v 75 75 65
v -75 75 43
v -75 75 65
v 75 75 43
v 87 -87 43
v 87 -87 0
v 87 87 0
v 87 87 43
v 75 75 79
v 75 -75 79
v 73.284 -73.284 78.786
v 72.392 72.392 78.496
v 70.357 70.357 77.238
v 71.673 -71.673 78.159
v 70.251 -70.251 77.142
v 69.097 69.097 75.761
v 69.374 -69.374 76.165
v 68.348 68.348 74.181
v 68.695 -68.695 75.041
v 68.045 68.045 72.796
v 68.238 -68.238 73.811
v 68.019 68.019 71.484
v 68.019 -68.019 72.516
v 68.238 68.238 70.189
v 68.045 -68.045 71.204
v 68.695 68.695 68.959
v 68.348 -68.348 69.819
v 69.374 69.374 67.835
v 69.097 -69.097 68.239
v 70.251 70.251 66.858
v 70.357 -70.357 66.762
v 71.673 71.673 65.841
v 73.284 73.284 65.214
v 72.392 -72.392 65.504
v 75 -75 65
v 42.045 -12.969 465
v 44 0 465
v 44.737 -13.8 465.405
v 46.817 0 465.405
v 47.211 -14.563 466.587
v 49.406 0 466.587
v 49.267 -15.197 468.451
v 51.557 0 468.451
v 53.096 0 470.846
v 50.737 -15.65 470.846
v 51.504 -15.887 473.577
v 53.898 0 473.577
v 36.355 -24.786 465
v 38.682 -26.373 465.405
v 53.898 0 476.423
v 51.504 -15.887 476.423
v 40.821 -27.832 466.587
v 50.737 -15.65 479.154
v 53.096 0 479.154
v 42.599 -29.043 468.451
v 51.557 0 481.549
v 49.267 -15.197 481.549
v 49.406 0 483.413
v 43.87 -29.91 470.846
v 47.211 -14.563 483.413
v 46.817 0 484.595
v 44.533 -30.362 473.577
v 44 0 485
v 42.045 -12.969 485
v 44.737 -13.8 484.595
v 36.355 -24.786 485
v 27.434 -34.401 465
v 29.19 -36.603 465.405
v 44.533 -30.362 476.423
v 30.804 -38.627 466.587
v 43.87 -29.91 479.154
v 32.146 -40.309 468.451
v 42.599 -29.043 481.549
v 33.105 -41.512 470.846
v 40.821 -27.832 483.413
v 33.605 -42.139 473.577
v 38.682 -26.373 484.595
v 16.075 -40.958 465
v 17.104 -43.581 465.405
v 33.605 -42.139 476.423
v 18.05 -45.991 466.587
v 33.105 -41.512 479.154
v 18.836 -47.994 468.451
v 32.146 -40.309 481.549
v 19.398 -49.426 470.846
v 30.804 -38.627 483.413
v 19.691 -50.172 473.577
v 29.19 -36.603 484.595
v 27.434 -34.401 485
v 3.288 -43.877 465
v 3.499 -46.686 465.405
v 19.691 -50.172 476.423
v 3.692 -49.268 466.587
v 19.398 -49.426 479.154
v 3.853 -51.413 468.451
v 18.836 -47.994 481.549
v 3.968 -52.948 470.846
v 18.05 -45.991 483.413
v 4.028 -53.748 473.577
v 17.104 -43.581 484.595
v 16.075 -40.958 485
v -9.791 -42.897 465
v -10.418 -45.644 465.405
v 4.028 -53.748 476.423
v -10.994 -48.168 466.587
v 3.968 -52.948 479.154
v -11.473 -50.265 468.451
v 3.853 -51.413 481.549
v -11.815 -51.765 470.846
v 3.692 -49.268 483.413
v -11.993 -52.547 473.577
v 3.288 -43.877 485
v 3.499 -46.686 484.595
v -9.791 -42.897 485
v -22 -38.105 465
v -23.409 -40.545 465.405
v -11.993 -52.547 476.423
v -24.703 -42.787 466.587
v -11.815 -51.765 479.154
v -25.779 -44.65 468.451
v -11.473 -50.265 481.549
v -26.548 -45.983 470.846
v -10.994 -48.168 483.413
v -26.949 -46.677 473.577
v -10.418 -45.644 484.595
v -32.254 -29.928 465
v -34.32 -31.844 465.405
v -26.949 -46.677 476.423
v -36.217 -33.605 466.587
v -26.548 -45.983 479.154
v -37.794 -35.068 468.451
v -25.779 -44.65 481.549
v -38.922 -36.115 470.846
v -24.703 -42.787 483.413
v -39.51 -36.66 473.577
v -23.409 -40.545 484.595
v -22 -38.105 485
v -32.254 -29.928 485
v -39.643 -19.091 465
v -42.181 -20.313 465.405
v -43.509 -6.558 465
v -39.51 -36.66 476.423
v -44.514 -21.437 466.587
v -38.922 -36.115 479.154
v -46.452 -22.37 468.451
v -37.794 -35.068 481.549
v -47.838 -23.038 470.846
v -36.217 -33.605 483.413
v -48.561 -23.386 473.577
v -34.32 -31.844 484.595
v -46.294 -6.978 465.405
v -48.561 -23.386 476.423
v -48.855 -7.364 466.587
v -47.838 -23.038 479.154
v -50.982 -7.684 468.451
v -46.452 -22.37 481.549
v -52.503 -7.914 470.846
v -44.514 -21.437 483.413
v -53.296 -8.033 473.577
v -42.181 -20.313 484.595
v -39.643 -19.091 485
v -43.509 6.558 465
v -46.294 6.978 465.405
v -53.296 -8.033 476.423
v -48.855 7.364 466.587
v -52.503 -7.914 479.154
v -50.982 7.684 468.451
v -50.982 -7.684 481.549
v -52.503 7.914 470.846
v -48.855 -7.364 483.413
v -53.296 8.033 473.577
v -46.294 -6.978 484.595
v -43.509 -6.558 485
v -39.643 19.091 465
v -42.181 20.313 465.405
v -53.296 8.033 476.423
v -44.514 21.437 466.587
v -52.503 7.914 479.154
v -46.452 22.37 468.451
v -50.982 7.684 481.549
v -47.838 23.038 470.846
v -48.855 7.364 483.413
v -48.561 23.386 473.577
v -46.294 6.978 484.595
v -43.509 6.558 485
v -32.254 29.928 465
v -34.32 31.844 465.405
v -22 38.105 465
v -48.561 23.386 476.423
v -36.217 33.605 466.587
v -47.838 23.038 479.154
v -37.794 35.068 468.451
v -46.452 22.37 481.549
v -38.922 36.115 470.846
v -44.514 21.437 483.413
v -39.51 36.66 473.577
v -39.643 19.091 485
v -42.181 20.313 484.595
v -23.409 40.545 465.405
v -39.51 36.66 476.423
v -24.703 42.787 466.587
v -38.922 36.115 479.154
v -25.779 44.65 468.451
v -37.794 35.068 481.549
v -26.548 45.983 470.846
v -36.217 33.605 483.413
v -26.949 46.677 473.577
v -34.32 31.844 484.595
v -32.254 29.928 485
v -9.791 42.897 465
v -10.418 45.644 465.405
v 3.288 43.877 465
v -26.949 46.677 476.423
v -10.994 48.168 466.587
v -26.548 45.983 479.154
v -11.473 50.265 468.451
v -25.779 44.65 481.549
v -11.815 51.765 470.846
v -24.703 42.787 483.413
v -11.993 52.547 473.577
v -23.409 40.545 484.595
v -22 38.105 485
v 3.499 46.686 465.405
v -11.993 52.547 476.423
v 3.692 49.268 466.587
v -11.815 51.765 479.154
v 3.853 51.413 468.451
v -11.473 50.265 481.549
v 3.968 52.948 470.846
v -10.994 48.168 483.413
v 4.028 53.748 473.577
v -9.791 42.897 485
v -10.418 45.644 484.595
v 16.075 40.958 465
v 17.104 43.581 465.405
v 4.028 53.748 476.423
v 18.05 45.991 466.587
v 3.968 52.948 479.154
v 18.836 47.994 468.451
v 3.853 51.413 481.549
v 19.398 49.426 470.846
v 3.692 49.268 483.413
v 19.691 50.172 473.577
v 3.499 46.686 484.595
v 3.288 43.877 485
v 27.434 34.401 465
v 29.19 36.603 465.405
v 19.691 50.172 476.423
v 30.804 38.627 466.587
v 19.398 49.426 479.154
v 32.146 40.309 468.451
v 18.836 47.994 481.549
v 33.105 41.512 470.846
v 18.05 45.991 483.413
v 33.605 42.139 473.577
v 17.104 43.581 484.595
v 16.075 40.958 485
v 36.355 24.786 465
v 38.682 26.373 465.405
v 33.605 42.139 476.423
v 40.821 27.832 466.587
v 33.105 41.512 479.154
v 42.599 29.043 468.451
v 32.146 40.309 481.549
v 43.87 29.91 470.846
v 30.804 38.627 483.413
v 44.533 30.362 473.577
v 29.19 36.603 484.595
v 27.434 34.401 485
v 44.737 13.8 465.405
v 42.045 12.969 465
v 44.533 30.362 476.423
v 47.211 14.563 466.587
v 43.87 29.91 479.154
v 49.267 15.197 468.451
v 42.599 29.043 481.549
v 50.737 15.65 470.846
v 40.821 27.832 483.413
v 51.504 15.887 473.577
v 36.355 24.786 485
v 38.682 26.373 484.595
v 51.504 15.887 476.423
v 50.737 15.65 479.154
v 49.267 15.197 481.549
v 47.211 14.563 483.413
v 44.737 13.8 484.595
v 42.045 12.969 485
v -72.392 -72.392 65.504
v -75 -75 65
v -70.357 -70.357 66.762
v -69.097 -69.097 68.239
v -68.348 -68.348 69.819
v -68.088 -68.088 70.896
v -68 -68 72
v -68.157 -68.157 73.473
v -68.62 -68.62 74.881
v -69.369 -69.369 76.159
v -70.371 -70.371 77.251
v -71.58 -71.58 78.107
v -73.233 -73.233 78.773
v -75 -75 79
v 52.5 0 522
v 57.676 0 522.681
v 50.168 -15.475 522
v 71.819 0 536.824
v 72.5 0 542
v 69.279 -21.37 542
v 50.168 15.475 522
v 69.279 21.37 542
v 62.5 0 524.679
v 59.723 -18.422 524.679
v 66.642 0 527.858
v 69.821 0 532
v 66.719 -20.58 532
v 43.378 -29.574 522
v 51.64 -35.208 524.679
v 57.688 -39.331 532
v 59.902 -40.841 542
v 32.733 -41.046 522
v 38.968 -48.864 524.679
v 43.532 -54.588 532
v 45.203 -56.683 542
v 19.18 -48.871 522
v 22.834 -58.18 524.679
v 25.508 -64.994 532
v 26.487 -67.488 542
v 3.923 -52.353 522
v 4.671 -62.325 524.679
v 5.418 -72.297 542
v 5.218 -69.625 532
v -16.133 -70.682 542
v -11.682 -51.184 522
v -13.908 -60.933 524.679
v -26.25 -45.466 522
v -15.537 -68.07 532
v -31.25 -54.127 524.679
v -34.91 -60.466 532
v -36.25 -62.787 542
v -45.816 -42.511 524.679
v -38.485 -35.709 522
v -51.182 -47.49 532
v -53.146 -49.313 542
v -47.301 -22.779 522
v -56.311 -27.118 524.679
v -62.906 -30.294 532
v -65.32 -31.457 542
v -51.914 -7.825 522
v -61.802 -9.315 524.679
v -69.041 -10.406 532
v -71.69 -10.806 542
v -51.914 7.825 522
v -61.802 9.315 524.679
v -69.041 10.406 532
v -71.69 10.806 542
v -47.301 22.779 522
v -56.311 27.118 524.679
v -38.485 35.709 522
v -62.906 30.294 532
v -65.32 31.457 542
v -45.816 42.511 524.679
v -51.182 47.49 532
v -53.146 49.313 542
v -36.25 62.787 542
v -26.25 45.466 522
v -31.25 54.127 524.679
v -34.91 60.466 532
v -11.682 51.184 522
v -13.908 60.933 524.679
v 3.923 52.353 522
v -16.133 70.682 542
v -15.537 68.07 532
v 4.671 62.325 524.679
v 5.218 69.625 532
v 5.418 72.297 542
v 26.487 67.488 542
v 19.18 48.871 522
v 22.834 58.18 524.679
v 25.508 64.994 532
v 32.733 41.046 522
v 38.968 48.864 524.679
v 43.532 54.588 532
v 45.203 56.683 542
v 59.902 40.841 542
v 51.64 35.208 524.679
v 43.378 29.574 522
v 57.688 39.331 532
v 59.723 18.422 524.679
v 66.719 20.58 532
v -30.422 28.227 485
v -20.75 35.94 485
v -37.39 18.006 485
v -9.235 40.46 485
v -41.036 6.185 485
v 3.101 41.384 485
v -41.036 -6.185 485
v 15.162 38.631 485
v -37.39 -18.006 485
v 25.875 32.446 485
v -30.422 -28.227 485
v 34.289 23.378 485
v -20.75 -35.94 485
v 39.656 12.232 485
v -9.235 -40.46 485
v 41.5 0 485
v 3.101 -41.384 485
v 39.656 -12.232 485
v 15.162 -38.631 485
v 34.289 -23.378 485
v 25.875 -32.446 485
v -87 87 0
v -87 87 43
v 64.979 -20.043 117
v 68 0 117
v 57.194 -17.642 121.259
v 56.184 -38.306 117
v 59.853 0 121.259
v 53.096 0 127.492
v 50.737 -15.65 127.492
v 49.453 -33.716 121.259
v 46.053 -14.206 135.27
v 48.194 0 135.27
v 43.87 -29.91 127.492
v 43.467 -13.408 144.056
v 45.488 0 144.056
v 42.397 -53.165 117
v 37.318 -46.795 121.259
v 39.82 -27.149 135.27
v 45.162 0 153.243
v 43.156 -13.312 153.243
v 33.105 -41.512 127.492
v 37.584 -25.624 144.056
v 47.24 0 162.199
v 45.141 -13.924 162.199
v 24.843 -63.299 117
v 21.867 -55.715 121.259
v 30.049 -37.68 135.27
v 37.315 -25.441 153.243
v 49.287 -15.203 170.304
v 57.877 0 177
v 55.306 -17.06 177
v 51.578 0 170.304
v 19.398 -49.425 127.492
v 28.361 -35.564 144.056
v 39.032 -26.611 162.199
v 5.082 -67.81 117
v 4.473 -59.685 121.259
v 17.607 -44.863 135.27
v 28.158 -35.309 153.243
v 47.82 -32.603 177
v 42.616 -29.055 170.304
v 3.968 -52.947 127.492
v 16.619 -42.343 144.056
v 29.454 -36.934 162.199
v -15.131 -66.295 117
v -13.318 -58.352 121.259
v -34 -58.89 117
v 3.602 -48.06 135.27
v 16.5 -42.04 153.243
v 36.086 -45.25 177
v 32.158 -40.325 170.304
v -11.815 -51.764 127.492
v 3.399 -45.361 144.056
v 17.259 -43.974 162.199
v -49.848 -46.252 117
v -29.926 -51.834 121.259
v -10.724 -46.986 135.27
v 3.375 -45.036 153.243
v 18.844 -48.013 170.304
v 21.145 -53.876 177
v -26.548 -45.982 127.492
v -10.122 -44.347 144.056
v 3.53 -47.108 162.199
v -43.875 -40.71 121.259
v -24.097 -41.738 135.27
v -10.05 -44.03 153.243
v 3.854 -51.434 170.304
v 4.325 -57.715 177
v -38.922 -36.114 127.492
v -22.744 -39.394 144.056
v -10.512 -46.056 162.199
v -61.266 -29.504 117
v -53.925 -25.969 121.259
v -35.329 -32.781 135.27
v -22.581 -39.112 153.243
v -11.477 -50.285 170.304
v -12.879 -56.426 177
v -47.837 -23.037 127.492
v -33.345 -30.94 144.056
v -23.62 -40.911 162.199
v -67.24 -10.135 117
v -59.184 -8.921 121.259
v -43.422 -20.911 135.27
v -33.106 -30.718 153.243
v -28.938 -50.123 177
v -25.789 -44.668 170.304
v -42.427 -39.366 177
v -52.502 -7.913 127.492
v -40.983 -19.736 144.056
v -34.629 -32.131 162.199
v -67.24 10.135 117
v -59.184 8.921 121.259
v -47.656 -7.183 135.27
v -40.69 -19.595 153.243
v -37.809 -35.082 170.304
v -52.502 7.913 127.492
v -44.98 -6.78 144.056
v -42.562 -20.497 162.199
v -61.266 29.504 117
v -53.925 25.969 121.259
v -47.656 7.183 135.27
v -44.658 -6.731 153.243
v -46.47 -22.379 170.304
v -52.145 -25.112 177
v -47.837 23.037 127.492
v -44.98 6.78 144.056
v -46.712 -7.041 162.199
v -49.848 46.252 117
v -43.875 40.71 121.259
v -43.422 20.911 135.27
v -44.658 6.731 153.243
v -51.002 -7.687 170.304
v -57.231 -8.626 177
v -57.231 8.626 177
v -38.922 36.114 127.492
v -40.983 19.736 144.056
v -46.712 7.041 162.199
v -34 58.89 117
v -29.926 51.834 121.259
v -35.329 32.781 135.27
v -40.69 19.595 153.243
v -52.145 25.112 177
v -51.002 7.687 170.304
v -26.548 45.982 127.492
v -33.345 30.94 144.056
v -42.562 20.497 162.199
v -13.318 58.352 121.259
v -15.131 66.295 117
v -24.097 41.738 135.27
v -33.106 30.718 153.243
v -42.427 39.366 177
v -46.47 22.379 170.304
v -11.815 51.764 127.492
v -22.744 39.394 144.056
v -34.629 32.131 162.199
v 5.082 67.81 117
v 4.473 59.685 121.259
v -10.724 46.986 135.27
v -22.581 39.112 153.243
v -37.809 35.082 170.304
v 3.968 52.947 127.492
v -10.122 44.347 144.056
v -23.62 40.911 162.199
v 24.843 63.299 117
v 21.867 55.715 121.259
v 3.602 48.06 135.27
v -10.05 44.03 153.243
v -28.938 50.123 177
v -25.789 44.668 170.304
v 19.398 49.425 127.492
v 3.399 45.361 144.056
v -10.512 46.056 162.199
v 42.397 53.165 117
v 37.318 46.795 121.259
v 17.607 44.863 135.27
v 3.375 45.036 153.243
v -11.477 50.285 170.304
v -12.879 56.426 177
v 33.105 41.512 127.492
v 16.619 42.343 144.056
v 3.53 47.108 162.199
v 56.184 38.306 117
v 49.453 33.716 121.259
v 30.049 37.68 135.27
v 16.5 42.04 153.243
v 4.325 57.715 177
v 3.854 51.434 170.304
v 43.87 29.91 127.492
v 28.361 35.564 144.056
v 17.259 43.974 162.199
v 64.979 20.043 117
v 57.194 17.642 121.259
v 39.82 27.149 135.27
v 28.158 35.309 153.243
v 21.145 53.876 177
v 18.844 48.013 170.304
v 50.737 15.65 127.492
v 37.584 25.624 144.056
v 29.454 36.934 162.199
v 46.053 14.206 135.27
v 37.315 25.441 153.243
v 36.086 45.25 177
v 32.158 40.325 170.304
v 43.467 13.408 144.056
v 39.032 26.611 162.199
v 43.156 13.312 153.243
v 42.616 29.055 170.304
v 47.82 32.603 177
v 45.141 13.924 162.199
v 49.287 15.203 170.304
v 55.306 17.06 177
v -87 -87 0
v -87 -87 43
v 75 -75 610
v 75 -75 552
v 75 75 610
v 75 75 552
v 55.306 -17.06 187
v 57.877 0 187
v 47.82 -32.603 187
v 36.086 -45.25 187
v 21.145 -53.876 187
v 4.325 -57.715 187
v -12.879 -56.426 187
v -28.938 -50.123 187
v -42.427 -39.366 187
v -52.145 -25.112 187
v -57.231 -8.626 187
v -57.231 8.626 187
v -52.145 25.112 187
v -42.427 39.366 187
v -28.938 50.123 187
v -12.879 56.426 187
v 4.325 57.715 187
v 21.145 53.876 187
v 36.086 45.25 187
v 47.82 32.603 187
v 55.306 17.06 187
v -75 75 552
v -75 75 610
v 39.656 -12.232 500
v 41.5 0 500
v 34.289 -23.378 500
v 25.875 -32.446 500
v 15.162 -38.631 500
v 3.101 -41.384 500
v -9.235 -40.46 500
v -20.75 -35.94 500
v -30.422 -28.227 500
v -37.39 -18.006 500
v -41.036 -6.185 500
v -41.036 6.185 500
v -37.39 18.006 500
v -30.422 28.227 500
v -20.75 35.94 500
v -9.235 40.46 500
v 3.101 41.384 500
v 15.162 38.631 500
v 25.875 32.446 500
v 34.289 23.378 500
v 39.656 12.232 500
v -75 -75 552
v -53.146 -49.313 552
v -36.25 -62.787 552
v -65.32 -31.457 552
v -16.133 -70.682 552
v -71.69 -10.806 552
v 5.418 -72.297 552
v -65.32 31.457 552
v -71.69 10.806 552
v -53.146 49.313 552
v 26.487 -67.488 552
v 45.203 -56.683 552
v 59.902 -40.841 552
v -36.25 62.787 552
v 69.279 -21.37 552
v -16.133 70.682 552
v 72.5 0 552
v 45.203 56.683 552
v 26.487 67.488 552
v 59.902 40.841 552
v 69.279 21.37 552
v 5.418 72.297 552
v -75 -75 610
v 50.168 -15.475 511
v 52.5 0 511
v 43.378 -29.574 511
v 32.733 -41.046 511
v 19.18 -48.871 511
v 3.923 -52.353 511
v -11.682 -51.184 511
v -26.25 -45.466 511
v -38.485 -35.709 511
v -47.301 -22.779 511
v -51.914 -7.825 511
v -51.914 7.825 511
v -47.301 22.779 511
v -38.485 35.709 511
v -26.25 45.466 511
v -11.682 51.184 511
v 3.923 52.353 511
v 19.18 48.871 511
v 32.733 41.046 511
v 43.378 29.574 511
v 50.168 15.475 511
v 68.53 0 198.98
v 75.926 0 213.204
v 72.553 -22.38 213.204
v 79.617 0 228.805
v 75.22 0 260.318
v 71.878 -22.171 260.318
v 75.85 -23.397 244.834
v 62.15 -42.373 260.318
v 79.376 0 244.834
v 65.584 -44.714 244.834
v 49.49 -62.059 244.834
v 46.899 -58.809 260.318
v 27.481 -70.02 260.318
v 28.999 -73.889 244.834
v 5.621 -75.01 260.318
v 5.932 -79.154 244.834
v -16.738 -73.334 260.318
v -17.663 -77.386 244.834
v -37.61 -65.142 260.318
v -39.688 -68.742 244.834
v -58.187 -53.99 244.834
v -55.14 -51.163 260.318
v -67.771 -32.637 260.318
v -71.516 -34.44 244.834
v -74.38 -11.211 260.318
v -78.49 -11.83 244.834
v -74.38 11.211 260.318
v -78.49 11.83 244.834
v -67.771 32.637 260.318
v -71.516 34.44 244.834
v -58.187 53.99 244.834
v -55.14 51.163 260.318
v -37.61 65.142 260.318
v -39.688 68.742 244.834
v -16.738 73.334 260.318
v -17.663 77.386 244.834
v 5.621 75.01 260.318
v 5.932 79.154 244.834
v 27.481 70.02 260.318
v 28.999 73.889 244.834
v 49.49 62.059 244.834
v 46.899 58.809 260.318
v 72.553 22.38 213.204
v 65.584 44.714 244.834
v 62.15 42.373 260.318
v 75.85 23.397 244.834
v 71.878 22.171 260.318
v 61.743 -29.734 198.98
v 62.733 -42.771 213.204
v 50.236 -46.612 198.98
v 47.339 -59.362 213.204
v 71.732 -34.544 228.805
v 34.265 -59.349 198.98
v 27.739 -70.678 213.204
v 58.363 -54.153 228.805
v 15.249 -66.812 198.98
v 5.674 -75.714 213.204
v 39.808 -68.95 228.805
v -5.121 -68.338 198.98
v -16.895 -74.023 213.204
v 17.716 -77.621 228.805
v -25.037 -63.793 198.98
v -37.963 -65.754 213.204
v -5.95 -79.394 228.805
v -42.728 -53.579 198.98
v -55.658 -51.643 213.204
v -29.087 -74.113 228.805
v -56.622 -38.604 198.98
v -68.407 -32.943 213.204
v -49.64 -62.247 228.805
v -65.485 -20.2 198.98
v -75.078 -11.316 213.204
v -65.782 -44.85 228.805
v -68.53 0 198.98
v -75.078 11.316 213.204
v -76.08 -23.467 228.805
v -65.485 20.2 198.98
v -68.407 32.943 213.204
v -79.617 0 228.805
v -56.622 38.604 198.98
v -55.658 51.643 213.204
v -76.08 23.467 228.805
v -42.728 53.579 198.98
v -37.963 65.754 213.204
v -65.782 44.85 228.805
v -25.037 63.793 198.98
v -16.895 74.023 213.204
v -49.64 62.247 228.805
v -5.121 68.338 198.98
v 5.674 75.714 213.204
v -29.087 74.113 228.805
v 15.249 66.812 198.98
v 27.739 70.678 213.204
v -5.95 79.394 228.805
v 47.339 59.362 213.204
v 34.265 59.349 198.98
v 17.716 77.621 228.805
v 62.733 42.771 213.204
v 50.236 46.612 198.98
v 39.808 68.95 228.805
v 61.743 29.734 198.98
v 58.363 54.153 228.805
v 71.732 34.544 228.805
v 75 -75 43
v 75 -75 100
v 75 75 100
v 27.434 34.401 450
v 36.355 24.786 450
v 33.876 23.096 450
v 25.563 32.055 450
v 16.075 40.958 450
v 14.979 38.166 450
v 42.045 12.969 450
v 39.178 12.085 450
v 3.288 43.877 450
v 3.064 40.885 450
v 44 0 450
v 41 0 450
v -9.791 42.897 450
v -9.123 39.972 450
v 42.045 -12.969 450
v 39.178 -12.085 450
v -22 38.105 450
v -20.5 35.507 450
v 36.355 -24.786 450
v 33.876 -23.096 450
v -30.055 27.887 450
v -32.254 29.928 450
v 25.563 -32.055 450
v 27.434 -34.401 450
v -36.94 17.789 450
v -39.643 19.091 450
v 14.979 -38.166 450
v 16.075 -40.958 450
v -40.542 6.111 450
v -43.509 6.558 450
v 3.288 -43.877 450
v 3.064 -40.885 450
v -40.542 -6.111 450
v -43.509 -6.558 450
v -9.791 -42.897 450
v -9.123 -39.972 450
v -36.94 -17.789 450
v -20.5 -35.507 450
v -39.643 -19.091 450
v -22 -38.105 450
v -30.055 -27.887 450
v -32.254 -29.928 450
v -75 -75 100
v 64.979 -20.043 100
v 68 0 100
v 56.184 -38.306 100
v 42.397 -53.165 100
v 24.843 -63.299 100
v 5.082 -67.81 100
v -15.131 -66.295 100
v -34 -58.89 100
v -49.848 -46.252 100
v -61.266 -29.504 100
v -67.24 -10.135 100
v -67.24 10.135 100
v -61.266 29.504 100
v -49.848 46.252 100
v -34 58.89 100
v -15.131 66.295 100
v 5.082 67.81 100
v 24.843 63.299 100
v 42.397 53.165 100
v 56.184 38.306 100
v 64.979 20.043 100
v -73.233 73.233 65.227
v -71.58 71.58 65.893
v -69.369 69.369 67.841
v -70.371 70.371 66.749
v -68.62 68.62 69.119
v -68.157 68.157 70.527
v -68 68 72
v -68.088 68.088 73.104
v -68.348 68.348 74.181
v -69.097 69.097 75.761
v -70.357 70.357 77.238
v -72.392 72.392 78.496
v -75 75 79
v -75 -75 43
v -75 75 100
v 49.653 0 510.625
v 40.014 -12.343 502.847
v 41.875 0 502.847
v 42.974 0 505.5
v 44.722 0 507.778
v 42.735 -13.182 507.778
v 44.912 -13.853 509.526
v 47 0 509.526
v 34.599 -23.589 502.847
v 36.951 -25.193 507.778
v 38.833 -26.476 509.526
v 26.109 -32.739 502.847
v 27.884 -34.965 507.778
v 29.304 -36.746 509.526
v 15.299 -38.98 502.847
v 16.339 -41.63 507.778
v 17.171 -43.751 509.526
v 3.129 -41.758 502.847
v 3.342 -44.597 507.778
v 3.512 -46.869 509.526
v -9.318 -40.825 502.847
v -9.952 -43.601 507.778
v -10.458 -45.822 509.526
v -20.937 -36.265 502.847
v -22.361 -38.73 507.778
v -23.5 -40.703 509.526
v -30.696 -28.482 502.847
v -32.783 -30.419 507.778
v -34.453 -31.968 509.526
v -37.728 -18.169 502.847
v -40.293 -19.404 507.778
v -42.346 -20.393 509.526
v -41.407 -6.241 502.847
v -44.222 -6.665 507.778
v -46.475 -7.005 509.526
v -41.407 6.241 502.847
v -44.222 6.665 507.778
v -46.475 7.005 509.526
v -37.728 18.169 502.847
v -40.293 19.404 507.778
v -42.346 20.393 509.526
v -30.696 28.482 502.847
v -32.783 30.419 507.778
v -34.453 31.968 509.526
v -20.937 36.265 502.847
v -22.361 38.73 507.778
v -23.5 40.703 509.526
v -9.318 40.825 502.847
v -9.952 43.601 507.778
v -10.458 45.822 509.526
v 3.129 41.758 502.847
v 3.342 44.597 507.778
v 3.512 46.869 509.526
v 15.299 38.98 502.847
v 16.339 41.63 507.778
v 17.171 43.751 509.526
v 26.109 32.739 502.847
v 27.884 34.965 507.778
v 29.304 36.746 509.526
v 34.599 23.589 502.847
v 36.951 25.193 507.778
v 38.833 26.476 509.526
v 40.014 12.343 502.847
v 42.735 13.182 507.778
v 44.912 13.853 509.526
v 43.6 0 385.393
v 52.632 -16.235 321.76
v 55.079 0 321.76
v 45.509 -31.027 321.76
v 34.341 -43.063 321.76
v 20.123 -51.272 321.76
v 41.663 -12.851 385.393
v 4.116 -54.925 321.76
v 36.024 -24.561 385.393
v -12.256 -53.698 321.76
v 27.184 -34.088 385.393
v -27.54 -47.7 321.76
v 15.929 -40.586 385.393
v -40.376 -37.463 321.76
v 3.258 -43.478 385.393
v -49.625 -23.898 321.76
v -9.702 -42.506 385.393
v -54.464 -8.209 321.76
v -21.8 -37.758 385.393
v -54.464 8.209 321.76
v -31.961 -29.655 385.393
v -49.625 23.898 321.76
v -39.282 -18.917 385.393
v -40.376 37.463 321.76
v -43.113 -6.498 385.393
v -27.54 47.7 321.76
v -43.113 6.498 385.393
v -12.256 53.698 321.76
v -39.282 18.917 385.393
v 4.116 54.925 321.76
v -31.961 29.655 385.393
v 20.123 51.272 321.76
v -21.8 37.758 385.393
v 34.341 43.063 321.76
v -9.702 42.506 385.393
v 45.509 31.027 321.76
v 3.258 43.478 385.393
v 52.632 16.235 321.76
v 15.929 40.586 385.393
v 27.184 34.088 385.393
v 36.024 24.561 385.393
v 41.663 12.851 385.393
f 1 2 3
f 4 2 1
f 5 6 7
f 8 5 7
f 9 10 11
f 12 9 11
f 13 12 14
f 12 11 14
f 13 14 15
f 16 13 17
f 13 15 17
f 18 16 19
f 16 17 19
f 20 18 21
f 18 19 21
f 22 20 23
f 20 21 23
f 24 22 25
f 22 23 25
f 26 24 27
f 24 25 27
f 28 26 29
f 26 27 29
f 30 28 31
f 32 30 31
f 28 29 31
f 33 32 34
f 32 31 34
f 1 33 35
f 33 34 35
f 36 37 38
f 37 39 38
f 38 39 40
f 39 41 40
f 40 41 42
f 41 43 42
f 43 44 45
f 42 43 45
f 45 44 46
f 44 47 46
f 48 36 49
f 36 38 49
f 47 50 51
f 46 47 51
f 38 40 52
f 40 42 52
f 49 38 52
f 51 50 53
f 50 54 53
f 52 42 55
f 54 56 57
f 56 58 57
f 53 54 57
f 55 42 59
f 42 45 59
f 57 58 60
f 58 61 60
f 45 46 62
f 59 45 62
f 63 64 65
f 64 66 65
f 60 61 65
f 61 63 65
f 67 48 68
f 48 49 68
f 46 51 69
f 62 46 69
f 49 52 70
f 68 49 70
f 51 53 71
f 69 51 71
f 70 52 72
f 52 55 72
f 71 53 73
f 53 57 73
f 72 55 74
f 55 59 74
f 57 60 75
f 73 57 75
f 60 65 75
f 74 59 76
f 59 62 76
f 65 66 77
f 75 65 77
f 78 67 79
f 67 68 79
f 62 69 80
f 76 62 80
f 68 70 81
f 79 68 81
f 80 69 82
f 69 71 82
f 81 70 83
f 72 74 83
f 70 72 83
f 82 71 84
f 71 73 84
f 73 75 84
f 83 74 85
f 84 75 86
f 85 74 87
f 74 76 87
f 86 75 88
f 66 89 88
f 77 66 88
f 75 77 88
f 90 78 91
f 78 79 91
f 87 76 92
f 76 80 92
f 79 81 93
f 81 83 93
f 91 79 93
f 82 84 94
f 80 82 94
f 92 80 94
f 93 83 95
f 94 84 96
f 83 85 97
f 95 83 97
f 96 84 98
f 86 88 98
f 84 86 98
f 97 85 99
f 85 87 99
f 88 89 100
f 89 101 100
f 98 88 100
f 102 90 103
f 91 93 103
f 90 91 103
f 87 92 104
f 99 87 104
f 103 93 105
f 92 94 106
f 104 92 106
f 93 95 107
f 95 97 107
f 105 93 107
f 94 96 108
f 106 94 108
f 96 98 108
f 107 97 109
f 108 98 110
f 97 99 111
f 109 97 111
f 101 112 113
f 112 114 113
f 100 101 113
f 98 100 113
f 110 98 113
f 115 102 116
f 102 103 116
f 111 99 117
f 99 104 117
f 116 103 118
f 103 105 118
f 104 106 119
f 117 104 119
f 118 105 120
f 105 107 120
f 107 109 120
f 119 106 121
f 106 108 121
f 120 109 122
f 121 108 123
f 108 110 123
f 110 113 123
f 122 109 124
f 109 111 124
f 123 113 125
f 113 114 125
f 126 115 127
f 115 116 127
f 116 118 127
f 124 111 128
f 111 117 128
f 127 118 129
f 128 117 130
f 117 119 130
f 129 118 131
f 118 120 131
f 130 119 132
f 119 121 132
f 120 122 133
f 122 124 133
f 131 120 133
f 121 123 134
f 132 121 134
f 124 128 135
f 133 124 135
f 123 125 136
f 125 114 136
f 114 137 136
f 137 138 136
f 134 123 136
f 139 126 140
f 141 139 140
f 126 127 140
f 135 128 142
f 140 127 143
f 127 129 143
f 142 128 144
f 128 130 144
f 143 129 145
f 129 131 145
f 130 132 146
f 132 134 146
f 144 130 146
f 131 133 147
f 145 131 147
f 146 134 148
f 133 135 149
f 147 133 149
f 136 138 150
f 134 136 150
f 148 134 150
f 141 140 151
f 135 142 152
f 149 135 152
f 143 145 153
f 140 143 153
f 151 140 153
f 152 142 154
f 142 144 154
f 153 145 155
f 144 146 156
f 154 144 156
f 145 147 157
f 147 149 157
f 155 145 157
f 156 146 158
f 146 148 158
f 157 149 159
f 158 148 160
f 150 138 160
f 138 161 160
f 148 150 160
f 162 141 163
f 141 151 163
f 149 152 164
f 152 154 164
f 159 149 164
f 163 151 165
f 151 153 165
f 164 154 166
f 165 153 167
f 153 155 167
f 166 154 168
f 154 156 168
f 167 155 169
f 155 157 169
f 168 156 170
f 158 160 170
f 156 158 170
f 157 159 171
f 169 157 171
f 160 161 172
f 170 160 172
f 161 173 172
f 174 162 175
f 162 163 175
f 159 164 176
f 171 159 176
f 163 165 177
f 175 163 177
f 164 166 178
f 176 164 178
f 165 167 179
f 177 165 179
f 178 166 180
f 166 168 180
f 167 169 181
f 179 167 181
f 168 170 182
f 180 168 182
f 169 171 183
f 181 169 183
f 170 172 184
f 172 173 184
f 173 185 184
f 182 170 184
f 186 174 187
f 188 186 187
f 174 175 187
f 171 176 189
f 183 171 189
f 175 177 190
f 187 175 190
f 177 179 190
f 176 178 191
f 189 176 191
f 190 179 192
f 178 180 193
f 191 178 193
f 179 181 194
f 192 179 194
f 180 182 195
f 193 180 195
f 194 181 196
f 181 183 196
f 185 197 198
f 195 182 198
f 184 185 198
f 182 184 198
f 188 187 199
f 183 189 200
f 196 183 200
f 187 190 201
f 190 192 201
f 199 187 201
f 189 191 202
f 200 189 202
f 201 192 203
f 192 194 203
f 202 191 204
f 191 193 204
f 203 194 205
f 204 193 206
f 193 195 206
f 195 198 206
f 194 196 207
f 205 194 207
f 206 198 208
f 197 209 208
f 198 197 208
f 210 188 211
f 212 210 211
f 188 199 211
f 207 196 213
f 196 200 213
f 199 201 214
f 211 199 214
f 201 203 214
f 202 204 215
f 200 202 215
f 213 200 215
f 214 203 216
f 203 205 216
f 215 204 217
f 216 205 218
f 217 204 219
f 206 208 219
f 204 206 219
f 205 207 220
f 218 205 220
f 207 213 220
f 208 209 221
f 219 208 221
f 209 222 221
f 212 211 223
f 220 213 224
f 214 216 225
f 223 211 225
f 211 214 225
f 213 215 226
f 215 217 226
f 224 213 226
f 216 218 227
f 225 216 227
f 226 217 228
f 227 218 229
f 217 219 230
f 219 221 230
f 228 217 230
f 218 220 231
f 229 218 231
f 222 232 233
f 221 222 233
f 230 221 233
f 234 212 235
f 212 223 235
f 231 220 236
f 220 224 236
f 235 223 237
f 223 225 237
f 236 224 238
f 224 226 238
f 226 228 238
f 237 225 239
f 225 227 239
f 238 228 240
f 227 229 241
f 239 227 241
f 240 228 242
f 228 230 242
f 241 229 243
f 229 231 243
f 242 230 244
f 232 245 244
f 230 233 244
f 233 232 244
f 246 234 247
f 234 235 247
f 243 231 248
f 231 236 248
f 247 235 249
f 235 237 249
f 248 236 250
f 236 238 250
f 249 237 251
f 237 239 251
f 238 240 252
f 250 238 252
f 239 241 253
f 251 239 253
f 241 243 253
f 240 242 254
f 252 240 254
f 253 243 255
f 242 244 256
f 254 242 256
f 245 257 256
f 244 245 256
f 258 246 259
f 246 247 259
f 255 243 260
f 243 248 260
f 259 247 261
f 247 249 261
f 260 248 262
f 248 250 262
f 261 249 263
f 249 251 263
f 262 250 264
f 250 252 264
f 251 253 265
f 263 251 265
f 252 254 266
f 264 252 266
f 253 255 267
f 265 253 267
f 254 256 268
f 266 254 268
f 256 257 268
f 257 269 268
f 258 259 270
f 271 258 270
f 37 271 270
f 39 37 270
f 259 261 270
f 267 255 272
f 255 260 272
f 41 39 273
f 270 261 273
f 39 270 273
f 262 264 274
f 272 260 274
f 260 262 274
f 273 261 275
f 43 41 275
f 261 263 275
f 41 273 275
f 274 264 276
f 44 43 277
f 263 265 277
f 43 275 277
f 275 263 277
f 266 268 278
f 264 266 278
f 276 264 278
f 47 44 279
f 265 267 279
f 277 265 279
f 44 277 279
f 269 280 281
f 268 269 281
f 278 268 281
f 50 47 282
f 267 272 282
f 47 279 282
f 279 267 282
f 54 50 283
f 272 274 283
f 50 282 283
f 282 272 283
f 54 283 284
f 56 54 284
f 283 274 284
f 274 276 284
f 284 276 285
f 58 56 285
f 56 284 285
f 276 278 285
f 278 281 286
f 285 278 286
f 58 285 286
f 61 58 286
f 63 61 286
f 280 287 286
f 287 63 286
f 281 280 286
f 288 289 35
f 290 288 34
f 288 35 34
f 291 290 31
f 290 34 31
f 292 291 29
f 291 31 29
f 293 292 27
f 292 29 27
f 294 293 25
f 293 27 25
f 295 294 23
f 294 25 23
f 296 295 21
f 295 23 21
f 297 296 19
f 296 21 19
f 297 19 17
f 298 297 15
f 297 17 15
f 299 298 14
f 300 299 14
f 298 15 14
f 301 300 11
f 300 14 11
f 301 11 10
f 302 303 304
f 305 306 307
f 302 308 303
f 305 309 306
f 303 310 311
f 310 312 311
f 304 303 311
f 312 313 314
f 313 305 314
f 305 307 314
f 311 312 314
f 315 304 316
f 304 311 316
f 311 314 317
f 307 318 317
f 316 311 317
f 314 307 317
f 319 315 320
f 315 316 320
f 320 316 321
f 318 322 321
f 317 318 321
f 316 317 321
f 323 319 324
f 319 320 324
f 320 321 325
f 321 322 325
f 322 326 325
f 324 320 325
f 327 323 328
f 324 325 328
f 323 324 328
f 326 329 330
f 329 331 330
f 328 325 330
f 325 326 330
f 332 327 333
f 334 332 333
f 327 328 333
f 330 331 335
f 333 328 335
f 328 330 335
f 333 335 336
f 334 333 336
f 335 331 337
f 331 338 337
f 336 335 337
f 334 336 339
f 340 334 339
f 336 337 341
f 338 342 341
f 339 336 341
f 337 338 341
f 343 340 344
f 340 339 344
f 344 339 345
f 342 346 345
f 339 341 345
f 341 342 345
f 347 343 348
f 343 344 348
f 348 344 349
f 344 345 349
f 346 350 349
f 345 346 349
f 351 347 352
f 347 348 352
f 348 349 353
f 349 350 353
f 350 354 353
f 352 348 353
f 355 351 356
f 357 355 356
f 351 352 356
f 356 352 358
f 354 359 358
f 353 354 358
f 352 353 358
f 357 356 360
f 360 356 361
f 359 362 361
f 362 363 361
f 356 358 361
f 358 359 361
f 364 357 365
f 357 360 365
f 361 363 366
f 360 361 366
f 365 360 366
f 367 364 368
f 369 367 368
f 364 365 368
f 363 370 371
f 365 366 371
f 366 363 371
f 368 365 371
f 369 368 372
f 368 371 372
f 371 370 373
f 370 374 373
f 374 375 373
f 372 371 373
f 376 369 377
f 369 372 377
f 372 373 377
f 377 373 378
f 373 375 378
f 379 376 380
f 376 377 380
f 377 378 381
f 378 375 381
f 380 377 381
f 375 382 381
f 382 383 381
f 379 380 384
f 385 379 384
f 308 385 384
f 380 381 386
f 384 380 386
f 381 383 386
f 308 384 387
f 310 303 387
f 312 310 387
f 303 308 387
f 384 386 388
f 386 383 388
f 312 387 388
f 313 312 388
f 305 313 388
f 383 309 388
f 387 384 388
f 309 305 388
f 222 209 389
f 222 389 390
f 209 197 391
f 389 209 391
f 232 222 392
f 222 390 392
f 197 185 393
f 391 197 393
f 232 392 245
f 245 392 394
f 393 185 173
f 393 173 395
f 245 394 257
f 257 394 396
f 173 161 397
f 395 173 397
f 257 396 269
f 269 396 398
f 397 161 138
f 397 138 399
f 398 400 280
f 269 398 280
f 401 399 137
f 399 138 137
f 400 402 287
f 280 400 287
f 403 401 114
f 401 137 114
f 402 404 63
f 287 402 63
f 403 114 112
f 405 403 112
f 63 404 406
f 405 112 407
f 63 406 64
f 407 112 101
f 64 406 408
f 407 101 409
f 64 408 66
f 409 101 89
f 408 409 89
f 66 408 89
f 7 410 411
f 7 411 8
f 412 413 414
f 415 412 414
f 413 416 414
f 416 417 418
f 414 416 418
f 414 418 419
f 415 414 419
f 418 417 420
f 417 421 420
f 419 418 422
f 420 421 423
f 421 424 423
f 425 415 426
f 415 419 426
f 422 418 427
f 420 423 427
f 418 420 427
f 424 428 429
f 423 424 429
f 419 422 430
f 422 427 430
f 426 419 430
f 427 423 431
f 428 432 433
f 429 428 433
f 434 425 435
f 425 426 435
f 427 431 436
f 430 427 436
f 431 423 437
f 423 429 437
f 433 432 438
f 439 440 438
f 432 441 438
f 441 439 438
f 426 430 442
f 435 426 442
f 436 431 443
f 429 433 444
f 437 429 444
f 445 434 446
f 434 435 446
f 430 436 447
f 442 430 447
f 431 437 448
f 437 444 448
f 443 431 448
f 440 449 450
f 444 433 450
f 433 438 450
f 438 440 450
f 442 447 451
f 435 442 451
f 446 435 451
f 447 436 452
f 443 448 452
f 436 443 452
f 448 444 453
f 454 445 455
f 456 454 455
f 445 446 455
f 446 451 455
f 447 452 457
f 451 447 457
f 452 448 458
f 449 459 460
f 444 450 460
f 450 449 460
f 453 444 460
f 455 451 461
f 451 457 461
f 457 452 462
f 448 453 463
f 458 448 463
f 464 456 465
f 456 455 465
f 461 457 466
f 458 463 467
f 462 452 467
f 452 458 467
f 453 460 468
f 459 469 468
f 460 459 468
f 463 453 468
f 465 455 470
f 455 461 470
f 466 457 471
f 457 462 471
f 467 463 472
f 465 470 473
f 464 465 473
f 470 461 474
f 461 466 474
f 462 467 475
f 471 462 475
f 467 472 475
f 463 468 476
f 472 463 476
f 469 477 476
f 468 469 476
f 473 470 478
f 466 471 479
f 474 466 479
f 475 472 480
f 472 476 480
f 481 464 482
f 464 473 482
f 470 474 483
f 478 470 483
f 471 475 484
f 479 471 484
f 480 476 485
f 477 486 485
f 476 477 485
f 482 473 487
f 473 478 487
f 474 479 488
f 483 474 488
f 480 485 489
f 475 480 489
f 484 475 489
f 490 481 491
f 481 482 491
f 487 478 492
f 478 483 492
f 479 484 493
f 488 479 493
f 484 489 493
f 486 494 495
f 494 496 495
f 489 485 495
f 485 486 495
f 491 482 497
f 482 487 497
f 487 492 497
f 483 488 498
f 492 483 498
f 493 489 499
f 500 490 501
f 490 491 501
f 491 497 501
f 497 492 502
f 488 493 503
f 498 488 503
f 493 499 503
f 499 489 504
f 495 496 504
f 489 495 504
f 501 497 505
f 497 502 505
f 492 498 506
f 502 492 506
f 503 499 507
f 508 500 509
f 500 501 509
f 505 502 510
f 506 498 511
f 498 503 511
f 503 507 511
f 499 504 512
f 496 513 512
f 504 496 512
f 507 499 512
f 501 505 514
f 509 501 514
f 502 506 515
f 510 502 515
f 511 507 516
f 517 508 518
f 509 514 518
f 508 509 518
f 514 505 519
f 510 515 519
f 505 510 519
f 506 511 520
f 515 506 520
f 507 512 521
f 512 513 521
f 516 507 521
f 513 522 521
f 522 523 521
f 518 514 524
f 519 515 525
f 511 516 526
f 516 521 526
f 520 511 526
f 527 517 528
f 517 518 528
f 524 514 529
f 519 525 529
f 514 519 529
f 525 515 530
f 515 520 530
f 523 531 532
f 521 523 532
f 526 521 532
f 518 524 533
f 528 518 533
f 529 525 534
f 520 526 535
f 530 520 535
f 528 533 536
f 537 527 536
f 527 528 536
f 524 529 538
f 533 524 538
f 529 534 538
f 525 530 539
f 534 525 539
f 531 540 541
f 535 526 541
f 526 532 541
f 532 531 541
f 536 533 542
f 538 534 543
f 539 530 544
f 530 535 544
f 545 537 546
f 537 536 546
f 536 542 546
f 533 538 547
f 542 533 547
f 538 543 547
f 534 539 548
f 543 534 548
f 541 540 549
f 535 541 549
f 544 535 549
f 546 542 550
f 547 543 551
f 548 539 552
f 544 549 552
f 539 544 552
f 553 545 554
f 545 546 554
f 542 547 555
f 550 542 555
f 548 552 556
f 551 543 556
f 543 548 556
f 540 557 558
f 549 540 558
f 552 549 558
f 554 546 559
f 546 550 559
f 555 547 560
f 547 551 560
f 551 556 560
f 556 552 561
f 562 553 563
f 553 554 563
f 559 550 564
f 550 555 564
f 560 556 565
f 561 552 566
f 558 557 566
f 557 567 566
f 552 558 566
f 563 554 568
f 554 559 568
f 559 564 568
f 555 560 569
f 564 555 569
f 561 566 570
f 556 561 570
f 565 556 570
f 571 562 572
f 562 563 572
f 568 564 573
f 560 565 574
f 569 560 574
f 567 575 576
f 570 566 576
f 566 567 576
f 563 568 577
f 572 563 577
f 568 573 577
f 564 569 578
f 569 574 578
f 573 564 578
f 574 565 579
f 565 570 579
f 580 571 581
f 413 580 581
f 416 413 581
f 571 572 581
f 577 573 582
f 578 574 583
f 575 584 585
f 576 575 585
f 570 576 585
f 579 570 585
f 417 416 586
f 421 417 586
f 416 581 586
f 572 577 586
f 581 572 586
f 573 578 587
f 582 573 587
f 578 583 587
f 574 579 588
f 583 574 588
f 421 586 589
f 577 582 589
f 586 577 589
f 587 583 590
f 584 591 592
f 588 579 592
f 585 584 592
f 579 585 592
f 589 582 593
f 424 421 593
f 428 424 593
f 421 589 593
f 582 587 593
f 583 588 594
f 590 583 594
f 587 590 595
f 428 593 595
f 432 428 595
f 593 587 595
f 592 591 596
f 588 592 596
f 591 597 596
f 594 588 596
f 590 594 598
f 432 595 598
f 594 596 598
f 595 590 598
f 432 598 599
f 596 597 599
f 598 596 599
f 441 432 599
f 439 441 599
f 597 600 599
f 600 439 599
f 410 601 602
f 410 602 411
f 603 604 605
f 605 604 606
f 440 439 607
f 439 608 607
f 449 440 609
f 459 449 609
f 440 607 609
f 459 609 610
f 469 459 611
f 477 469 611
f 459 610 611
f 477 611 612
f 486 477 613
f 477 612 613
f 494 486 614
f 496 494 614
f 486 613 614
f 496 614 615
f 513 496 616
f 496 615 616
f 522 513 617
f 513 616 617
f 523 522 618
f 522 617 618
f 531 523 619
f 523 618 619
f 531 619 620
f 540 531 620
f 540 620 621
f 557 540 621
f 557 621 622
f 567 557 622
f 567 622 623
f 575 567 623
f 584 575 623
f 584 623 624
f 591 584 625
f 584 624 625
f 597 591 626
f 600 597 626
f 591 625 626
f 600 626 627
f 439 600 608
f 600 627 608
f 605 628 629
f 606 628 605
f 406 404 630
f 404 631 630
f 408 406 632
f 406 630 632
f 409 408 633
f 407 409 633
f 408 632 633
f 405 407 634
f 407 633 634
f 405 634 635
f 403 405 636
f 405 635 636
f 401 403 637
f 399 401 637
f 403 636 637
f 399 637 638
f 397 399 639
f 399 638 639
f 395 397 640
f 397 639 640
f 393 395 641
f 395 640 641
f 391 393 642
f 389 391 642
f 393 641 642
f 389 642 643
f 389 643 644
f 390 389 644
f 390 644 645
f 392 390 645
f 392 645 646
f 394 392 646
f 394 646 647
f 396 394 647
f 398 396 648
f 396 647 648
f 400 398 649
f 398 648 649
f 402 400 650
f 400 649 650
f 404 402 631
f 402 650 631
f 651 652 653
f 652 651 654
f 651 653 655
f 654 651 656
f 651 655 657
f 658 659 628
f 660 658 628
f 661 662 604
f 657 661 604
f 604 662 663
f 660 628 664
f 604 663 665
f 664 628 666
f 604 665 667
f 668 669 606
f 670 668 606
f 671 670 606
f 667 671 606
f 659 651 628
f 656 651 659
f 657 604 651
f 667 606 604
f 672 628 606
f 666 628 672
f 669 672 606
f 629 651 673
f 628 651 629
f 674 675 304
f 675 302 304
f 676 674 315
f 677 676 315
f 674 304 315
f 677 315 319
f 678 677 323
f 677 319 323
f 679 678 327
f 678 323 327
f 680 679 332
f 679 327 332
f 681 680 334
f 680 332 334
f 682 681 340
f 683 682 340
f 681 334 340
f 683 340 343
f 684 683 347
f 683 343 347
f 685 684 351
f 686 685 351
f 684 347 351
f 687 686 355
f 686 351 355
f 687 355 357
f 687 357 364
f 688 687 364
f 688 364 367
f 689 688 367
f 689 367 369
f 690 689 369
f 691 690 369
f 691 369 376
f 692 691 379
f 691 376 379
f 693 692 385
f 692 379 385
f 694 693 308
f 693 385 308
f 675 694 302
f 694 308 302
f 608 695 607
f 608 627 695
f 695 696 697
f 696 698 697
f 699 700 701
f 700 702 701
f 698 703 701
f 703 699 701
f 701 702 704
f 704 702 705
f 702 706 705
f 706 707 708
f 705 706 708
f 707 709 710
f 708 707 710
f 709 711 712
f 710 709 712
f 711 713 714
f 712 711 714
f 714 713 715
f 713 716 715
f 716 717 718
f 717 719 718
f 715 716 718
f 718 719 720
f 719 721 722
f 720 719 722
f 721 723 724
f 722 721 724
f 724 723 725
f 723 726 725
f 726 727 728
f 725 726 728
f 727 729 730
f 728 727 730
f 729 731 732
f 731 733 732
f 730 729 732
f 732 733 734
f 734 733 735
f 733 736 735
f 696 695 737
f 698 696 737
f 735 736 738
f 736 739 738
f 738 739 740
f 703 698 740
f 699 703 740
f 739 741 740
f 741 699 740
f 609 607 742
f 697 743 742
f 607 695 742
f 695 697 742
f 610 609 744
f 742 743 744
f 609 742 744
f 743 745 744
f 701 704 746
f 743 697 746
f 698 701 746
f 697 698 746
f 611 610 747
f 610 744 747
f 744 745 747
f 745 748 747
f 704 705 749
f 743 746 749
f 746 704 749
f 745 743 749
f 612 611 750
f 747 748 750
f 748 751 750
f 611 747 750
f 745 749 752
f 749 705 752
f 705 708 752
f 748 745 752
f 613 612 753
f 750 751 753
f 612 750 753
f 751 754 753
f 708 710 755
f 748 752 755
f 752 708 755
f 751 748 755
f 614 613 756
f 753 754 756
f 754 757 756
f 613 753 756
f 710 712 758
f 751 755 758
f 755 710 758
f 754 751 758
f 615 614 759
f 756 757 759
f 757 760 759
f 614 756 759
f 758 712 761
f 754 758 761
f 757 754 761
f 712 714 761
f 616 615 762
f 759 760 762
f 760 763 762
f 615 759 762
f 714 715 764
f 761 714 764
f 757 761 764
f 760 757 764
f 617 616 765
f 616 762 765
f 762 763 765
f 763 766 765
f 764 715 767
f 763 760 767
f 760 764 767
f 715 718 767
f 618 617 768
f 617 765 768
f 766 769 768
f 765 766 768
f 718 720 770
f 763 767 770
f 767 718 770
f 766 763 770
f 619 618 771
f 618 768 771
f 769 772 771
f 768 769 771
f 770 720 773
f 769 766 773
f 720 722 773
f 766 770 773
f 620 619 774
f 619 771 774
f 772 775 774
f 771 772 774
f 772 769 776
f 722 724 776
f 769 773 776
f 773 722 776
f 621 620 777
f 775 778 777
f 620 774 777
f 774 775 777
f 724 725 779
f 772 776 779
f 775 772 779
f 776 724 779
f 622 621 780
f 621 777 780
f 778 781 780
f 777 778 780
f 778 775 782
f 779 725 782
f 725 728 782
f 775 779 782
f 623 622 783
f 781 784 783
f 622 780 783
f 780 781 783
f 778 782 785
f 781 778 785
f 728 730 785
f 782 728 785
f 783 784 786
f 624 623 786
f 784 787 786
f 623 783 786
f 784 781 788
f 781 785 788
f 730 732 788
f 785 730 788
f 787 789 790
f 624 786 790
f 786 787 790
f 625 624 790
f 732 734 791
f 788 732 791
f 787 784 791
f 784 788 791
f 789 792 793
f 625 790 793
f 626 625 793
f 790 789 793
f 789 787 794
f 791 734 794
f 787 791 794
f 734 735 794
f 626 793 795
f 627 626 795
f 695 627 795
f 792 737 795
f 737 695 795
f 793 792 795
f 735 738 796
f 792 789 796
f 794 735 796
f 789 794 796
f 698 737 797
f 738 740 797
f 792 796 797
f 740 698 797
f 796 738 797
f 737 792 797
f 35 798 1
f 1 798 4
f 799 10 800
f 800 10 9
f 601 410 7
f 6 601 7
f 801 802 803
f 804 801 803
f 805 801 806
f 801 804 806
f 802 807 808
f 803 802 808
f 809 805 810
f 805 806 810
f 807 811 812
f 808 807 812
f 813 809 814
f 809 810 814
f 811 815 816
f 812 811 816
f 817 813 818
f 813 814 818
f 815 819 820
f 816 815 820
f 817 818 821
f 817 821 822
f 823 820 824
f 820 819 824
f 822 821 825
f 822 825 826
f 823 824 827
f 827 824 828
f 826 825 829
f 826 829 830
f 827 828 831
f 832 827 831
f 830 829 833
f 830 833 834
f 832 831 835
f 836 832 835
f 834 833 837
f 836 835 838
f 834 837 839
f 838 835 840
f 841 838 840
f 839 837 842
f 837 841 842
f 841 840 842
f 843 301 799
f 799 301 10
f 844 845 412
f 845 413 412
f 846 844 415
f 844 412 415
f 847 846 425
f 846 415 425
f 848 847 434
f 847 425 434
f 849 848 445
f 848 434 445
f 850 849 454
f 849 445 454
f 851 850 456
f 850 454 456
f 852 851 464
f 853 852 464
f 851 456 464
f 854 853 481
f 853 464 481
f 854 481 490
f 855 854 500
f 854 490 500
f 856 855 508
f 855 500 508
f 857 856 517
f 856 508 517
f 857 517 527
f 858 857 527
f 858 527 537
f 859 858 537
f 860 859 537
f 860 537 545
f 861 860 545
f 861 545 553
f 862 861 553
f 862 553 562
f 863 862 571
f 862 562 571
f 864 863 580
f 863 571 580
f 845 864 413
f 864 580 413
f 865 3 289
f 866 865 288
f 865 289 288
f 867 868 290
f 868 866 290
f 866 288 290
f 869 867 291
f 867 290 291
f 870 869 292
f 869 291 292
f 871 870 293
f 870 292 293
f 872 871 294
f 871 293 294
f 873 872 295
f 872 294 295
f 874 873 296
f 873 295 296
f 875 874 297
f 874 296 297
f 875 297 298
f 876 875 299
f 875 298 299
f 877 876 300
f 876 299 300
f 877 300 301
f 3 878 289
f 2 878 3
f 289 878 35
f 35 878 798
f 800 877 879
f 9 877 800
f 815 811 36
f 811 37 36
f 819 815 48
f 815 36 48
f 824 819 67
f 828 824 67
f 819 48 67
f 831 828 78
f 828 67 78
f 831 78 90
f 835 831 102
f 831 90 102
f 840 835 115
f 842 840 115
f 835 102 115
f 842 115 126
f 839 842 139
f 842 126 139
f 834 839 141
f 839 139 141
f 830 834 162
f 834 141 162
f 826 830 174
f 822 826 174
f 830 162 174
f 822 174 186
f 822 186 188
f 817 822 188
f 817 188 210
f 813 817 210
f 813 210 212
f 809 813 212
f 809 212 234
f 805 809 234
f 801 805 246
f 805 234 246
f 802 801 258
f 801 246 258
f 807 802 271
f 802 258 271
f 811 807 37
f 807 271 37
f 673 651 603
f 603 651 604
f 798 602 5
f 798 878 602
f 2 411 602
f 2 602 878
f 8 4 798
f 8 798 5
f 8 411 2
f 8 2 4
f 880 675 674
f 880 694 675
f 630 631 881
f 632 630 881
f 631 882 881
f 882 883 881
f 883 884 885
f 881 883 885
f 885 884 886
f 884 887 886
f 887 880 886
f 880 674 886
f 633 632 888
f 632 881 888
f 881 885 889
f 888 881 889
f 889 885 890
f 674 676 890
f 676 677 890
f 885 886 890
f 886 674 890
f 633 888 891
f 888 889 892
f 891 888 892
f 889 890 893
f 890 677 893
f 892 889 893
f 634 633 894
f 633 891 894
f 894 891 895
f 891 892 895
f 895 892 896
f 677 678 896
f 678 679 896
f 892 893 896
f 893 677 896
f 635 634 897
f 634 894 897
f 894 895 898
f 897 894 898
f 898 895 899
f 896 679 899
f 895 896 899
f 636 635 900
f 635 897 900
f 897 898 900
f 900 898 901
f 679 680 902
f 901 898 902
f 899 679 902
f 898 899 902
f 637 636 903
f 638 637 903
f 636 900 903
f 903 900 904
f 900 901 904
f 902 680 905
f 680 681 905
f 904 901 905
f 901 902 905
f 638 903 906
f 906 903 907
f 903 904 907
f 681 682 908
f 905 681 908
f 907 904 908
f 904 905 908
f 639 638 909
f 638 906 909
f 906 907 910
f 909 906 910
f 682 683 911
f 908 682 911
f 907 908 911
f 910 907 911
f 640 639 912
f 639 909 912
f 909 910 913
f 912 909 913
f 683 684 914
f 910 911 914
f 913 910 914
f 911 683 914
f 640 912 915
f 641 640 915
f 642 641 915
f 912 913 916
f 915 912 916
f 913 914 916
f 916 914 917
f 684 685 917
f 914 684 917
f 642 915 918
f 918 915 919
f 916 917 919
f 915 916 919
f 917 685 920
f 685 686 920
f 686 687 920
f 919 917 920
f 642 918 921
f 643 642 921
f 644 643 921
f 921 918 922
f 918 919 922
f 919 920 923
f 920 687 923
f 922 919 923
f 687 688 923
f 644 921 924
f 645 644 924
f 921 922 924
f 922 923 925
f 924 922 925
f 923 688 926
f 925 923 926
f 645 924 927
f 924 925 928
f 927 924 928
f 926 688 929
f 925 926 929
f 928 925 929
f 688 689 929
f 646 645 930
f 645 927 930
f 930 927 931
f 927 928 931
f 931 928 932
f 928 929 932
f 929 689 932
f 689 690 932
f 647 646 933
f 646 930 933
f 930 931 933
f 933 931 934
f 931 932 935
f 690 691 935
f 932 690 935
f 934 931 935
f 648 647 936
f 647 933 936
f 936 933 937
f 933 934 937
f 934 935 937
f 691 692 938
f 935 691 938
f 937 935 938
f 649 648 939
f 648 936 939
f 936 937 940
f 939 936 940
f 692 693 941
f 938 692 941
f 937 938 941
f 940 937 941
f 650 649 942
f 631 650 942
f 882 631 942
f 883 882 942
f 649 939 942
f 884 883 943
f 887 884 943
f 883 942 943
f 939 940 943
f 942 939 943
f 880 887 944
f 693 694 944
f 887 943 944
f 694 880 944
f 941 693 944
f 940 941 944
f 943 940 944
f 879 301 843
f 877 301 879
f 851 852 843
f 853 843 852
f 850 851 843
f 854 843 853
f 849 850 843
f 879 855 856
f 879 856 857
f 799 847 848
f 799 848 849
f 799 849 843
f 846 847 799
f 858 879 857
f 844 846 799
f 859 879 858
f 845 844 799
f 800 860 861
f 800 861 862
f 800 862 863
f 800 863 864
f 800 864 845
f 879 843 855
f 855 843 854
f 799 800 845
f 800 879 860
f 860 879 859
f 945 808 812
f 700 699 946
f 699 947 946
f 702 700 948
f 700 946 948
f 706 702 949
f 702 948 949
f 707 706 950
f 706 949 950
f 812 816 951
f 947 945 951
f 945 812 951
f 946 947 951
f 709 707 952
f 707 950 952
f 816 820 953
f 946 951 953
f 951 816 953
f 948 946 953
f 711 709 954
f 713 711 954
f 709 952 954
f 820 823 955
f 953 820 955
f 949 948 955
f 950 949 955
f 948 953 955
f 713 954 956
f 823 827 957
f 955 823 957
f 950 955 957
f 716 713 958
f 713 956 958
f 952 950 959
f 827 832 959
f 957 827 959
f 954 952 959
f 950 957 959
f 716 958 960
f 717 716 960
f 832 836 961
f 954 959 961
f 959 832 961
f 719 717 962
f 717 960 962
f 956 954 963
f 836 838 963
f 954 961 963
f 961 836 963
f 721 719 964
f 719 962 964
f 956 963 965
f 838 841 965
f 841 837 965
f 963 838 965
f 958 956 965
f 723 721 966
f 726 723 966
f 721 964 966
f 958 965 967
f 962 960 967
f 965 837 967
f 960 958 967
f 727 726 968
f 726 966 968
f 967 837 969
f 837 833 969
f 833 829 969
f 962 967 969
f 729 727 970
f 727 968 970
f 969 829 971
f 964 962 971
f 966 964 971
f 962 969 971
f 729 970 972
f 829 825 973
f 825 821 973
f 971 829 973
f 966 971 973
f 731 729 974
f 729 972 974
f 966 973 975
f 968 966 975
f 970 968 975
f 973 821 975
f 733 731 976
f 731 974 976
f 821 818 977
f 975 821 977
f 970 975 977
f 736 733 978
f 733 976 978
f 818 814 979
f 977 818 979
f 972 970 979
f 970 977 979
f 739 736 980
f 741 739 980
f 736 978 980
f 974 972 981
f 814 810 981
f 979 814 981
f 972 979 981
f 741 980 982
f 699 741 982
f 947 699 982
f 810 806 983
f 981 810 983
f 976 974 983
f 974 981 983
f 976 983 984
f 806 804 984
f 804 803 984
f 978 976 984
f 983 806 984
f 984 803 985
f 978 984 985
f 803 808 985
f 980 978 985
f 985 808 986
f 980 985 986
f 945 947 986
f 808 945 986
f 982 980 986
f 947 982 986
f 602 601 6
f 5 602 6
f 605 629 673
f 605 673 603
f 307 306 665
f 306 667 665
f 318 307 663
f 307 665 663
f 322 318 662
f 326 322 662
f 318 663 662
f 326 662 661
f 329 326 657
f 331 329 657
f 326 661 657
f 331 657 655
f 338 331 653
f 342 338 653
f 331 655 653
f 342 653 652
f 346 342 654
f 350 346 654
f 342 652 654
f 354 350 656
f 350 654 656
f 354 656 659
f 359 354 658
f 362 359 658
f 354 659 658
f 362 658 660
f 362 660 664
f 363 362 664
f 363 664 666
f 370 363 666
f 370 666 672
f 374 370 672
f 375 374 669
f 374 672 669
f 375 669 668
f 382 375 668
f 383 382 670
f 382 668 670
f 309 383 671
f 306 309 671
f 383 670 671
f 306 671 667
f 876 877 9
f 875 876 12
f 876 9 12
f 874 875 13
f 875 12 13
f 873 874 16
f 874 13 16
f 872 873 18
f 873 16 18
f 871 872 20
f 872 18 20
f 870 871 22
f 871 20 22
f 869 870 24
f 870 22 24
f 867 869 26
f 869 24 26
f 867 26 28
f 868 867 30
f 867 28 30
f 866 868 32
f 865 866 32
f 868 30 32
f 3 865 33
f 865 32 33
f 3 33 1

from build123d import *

# Parameters (mm, degrees)
F0_W      = 174
F0_H      = 174
F1_DEPTH  = 43
F2_W      = 150
F2_H      = 150
F3_DEPTH  = 57
F4_R      = 7
F5_DEPTH  = 162.001
F6_R      = 7
F7_DEPTH  = 162.001
F10_W     = 150
F10_H     = 150
F11_DEPTH = 58


with BuildPart() as f1:
    # F0 (on Top) → F1 (new body)
    with BuildSketch(Plane.XY):
        Rectangle(F0_W, F0_H)
    extrude(amount=F1_DEPTH)

    # F2 (on face) → F3 (join)
    with BuildSketch(Plane.XY.offset(43)):
        Rectangle(F2_W, F2_H)
    extrude(amount=F3_DEPTH)

    # F4 (on face) → F5 (cut, through all)
    with BuildSketch(Plane.YZ.offset(75)):
        with Locations((75, 72)):
            Circle(F4_R)
        with Locations((-75, 72)):
            Circle(F4_R)
    extrude(amount=-F5_DEPTH, mode=Mode.SUBTRACT)

    # F6 (on face) → F7 (cut, through all)
    with BuildSketch(Plane.XZ.offset(75)):
        with Locations((75, 72)):
            Circle(F6_R)
        with Locations((-75, 72)):
            Circle(F6_R)
    extrude(amount=-F7_DEPTH, mode=Mode.SUBTRACT)

    # F8 (on Front) → F9 (revolve)
    with BuildSketch(Plane.XZ):
        with BuildLine():
            Line((0, 552), (0, 100))
            Line((0, 100), (68, 100))
            Line((68, 100), (68, 117))
            ThreePointArc((68, 117), (45.487756, 144.055766), (57.876986, 177))
            Line((57.876986, 177), (57.876986, 187))
            ThreePointArc((57.876986, 187), (78.254408, 220.889858), (75.220037, 260.317695))
            ThreePointArc((75.220037, 260.317695), (48.239235, 353.378088), (41, 450))
            Line((41, 450), (44, 450))
            Line((44, 450), (44, 465))
            ThreePointArc((44, 465), (54, 475), (44, 485))
            Line((44, 485), (41.5, 485))
            Line((41.5, 485), (41.5, 500))
            ThreePointArc((41.5, 500), (44.721825, 507.778175), (52.5, 511))
            Line((52.5, 511), (52.5, 522))
            ThreePointArc((52.5, 522), (66.642136, 527.857864), (72.5, 542))
            Line((72.5, 542), (72.5, 552))
            Line((72.5, 552), (0, 552))
        make_face()
    revolve(axis=Axis((0, 0, 326), (0, 0, -1)))

    # F10 (on face) → F11 (join)
    with BuildSketch(Plane.XY.offset(552)):
        Rectangle(F10_W, F10_H)
    extrude(amount=F11_DEPTH)


solid = f1.part
